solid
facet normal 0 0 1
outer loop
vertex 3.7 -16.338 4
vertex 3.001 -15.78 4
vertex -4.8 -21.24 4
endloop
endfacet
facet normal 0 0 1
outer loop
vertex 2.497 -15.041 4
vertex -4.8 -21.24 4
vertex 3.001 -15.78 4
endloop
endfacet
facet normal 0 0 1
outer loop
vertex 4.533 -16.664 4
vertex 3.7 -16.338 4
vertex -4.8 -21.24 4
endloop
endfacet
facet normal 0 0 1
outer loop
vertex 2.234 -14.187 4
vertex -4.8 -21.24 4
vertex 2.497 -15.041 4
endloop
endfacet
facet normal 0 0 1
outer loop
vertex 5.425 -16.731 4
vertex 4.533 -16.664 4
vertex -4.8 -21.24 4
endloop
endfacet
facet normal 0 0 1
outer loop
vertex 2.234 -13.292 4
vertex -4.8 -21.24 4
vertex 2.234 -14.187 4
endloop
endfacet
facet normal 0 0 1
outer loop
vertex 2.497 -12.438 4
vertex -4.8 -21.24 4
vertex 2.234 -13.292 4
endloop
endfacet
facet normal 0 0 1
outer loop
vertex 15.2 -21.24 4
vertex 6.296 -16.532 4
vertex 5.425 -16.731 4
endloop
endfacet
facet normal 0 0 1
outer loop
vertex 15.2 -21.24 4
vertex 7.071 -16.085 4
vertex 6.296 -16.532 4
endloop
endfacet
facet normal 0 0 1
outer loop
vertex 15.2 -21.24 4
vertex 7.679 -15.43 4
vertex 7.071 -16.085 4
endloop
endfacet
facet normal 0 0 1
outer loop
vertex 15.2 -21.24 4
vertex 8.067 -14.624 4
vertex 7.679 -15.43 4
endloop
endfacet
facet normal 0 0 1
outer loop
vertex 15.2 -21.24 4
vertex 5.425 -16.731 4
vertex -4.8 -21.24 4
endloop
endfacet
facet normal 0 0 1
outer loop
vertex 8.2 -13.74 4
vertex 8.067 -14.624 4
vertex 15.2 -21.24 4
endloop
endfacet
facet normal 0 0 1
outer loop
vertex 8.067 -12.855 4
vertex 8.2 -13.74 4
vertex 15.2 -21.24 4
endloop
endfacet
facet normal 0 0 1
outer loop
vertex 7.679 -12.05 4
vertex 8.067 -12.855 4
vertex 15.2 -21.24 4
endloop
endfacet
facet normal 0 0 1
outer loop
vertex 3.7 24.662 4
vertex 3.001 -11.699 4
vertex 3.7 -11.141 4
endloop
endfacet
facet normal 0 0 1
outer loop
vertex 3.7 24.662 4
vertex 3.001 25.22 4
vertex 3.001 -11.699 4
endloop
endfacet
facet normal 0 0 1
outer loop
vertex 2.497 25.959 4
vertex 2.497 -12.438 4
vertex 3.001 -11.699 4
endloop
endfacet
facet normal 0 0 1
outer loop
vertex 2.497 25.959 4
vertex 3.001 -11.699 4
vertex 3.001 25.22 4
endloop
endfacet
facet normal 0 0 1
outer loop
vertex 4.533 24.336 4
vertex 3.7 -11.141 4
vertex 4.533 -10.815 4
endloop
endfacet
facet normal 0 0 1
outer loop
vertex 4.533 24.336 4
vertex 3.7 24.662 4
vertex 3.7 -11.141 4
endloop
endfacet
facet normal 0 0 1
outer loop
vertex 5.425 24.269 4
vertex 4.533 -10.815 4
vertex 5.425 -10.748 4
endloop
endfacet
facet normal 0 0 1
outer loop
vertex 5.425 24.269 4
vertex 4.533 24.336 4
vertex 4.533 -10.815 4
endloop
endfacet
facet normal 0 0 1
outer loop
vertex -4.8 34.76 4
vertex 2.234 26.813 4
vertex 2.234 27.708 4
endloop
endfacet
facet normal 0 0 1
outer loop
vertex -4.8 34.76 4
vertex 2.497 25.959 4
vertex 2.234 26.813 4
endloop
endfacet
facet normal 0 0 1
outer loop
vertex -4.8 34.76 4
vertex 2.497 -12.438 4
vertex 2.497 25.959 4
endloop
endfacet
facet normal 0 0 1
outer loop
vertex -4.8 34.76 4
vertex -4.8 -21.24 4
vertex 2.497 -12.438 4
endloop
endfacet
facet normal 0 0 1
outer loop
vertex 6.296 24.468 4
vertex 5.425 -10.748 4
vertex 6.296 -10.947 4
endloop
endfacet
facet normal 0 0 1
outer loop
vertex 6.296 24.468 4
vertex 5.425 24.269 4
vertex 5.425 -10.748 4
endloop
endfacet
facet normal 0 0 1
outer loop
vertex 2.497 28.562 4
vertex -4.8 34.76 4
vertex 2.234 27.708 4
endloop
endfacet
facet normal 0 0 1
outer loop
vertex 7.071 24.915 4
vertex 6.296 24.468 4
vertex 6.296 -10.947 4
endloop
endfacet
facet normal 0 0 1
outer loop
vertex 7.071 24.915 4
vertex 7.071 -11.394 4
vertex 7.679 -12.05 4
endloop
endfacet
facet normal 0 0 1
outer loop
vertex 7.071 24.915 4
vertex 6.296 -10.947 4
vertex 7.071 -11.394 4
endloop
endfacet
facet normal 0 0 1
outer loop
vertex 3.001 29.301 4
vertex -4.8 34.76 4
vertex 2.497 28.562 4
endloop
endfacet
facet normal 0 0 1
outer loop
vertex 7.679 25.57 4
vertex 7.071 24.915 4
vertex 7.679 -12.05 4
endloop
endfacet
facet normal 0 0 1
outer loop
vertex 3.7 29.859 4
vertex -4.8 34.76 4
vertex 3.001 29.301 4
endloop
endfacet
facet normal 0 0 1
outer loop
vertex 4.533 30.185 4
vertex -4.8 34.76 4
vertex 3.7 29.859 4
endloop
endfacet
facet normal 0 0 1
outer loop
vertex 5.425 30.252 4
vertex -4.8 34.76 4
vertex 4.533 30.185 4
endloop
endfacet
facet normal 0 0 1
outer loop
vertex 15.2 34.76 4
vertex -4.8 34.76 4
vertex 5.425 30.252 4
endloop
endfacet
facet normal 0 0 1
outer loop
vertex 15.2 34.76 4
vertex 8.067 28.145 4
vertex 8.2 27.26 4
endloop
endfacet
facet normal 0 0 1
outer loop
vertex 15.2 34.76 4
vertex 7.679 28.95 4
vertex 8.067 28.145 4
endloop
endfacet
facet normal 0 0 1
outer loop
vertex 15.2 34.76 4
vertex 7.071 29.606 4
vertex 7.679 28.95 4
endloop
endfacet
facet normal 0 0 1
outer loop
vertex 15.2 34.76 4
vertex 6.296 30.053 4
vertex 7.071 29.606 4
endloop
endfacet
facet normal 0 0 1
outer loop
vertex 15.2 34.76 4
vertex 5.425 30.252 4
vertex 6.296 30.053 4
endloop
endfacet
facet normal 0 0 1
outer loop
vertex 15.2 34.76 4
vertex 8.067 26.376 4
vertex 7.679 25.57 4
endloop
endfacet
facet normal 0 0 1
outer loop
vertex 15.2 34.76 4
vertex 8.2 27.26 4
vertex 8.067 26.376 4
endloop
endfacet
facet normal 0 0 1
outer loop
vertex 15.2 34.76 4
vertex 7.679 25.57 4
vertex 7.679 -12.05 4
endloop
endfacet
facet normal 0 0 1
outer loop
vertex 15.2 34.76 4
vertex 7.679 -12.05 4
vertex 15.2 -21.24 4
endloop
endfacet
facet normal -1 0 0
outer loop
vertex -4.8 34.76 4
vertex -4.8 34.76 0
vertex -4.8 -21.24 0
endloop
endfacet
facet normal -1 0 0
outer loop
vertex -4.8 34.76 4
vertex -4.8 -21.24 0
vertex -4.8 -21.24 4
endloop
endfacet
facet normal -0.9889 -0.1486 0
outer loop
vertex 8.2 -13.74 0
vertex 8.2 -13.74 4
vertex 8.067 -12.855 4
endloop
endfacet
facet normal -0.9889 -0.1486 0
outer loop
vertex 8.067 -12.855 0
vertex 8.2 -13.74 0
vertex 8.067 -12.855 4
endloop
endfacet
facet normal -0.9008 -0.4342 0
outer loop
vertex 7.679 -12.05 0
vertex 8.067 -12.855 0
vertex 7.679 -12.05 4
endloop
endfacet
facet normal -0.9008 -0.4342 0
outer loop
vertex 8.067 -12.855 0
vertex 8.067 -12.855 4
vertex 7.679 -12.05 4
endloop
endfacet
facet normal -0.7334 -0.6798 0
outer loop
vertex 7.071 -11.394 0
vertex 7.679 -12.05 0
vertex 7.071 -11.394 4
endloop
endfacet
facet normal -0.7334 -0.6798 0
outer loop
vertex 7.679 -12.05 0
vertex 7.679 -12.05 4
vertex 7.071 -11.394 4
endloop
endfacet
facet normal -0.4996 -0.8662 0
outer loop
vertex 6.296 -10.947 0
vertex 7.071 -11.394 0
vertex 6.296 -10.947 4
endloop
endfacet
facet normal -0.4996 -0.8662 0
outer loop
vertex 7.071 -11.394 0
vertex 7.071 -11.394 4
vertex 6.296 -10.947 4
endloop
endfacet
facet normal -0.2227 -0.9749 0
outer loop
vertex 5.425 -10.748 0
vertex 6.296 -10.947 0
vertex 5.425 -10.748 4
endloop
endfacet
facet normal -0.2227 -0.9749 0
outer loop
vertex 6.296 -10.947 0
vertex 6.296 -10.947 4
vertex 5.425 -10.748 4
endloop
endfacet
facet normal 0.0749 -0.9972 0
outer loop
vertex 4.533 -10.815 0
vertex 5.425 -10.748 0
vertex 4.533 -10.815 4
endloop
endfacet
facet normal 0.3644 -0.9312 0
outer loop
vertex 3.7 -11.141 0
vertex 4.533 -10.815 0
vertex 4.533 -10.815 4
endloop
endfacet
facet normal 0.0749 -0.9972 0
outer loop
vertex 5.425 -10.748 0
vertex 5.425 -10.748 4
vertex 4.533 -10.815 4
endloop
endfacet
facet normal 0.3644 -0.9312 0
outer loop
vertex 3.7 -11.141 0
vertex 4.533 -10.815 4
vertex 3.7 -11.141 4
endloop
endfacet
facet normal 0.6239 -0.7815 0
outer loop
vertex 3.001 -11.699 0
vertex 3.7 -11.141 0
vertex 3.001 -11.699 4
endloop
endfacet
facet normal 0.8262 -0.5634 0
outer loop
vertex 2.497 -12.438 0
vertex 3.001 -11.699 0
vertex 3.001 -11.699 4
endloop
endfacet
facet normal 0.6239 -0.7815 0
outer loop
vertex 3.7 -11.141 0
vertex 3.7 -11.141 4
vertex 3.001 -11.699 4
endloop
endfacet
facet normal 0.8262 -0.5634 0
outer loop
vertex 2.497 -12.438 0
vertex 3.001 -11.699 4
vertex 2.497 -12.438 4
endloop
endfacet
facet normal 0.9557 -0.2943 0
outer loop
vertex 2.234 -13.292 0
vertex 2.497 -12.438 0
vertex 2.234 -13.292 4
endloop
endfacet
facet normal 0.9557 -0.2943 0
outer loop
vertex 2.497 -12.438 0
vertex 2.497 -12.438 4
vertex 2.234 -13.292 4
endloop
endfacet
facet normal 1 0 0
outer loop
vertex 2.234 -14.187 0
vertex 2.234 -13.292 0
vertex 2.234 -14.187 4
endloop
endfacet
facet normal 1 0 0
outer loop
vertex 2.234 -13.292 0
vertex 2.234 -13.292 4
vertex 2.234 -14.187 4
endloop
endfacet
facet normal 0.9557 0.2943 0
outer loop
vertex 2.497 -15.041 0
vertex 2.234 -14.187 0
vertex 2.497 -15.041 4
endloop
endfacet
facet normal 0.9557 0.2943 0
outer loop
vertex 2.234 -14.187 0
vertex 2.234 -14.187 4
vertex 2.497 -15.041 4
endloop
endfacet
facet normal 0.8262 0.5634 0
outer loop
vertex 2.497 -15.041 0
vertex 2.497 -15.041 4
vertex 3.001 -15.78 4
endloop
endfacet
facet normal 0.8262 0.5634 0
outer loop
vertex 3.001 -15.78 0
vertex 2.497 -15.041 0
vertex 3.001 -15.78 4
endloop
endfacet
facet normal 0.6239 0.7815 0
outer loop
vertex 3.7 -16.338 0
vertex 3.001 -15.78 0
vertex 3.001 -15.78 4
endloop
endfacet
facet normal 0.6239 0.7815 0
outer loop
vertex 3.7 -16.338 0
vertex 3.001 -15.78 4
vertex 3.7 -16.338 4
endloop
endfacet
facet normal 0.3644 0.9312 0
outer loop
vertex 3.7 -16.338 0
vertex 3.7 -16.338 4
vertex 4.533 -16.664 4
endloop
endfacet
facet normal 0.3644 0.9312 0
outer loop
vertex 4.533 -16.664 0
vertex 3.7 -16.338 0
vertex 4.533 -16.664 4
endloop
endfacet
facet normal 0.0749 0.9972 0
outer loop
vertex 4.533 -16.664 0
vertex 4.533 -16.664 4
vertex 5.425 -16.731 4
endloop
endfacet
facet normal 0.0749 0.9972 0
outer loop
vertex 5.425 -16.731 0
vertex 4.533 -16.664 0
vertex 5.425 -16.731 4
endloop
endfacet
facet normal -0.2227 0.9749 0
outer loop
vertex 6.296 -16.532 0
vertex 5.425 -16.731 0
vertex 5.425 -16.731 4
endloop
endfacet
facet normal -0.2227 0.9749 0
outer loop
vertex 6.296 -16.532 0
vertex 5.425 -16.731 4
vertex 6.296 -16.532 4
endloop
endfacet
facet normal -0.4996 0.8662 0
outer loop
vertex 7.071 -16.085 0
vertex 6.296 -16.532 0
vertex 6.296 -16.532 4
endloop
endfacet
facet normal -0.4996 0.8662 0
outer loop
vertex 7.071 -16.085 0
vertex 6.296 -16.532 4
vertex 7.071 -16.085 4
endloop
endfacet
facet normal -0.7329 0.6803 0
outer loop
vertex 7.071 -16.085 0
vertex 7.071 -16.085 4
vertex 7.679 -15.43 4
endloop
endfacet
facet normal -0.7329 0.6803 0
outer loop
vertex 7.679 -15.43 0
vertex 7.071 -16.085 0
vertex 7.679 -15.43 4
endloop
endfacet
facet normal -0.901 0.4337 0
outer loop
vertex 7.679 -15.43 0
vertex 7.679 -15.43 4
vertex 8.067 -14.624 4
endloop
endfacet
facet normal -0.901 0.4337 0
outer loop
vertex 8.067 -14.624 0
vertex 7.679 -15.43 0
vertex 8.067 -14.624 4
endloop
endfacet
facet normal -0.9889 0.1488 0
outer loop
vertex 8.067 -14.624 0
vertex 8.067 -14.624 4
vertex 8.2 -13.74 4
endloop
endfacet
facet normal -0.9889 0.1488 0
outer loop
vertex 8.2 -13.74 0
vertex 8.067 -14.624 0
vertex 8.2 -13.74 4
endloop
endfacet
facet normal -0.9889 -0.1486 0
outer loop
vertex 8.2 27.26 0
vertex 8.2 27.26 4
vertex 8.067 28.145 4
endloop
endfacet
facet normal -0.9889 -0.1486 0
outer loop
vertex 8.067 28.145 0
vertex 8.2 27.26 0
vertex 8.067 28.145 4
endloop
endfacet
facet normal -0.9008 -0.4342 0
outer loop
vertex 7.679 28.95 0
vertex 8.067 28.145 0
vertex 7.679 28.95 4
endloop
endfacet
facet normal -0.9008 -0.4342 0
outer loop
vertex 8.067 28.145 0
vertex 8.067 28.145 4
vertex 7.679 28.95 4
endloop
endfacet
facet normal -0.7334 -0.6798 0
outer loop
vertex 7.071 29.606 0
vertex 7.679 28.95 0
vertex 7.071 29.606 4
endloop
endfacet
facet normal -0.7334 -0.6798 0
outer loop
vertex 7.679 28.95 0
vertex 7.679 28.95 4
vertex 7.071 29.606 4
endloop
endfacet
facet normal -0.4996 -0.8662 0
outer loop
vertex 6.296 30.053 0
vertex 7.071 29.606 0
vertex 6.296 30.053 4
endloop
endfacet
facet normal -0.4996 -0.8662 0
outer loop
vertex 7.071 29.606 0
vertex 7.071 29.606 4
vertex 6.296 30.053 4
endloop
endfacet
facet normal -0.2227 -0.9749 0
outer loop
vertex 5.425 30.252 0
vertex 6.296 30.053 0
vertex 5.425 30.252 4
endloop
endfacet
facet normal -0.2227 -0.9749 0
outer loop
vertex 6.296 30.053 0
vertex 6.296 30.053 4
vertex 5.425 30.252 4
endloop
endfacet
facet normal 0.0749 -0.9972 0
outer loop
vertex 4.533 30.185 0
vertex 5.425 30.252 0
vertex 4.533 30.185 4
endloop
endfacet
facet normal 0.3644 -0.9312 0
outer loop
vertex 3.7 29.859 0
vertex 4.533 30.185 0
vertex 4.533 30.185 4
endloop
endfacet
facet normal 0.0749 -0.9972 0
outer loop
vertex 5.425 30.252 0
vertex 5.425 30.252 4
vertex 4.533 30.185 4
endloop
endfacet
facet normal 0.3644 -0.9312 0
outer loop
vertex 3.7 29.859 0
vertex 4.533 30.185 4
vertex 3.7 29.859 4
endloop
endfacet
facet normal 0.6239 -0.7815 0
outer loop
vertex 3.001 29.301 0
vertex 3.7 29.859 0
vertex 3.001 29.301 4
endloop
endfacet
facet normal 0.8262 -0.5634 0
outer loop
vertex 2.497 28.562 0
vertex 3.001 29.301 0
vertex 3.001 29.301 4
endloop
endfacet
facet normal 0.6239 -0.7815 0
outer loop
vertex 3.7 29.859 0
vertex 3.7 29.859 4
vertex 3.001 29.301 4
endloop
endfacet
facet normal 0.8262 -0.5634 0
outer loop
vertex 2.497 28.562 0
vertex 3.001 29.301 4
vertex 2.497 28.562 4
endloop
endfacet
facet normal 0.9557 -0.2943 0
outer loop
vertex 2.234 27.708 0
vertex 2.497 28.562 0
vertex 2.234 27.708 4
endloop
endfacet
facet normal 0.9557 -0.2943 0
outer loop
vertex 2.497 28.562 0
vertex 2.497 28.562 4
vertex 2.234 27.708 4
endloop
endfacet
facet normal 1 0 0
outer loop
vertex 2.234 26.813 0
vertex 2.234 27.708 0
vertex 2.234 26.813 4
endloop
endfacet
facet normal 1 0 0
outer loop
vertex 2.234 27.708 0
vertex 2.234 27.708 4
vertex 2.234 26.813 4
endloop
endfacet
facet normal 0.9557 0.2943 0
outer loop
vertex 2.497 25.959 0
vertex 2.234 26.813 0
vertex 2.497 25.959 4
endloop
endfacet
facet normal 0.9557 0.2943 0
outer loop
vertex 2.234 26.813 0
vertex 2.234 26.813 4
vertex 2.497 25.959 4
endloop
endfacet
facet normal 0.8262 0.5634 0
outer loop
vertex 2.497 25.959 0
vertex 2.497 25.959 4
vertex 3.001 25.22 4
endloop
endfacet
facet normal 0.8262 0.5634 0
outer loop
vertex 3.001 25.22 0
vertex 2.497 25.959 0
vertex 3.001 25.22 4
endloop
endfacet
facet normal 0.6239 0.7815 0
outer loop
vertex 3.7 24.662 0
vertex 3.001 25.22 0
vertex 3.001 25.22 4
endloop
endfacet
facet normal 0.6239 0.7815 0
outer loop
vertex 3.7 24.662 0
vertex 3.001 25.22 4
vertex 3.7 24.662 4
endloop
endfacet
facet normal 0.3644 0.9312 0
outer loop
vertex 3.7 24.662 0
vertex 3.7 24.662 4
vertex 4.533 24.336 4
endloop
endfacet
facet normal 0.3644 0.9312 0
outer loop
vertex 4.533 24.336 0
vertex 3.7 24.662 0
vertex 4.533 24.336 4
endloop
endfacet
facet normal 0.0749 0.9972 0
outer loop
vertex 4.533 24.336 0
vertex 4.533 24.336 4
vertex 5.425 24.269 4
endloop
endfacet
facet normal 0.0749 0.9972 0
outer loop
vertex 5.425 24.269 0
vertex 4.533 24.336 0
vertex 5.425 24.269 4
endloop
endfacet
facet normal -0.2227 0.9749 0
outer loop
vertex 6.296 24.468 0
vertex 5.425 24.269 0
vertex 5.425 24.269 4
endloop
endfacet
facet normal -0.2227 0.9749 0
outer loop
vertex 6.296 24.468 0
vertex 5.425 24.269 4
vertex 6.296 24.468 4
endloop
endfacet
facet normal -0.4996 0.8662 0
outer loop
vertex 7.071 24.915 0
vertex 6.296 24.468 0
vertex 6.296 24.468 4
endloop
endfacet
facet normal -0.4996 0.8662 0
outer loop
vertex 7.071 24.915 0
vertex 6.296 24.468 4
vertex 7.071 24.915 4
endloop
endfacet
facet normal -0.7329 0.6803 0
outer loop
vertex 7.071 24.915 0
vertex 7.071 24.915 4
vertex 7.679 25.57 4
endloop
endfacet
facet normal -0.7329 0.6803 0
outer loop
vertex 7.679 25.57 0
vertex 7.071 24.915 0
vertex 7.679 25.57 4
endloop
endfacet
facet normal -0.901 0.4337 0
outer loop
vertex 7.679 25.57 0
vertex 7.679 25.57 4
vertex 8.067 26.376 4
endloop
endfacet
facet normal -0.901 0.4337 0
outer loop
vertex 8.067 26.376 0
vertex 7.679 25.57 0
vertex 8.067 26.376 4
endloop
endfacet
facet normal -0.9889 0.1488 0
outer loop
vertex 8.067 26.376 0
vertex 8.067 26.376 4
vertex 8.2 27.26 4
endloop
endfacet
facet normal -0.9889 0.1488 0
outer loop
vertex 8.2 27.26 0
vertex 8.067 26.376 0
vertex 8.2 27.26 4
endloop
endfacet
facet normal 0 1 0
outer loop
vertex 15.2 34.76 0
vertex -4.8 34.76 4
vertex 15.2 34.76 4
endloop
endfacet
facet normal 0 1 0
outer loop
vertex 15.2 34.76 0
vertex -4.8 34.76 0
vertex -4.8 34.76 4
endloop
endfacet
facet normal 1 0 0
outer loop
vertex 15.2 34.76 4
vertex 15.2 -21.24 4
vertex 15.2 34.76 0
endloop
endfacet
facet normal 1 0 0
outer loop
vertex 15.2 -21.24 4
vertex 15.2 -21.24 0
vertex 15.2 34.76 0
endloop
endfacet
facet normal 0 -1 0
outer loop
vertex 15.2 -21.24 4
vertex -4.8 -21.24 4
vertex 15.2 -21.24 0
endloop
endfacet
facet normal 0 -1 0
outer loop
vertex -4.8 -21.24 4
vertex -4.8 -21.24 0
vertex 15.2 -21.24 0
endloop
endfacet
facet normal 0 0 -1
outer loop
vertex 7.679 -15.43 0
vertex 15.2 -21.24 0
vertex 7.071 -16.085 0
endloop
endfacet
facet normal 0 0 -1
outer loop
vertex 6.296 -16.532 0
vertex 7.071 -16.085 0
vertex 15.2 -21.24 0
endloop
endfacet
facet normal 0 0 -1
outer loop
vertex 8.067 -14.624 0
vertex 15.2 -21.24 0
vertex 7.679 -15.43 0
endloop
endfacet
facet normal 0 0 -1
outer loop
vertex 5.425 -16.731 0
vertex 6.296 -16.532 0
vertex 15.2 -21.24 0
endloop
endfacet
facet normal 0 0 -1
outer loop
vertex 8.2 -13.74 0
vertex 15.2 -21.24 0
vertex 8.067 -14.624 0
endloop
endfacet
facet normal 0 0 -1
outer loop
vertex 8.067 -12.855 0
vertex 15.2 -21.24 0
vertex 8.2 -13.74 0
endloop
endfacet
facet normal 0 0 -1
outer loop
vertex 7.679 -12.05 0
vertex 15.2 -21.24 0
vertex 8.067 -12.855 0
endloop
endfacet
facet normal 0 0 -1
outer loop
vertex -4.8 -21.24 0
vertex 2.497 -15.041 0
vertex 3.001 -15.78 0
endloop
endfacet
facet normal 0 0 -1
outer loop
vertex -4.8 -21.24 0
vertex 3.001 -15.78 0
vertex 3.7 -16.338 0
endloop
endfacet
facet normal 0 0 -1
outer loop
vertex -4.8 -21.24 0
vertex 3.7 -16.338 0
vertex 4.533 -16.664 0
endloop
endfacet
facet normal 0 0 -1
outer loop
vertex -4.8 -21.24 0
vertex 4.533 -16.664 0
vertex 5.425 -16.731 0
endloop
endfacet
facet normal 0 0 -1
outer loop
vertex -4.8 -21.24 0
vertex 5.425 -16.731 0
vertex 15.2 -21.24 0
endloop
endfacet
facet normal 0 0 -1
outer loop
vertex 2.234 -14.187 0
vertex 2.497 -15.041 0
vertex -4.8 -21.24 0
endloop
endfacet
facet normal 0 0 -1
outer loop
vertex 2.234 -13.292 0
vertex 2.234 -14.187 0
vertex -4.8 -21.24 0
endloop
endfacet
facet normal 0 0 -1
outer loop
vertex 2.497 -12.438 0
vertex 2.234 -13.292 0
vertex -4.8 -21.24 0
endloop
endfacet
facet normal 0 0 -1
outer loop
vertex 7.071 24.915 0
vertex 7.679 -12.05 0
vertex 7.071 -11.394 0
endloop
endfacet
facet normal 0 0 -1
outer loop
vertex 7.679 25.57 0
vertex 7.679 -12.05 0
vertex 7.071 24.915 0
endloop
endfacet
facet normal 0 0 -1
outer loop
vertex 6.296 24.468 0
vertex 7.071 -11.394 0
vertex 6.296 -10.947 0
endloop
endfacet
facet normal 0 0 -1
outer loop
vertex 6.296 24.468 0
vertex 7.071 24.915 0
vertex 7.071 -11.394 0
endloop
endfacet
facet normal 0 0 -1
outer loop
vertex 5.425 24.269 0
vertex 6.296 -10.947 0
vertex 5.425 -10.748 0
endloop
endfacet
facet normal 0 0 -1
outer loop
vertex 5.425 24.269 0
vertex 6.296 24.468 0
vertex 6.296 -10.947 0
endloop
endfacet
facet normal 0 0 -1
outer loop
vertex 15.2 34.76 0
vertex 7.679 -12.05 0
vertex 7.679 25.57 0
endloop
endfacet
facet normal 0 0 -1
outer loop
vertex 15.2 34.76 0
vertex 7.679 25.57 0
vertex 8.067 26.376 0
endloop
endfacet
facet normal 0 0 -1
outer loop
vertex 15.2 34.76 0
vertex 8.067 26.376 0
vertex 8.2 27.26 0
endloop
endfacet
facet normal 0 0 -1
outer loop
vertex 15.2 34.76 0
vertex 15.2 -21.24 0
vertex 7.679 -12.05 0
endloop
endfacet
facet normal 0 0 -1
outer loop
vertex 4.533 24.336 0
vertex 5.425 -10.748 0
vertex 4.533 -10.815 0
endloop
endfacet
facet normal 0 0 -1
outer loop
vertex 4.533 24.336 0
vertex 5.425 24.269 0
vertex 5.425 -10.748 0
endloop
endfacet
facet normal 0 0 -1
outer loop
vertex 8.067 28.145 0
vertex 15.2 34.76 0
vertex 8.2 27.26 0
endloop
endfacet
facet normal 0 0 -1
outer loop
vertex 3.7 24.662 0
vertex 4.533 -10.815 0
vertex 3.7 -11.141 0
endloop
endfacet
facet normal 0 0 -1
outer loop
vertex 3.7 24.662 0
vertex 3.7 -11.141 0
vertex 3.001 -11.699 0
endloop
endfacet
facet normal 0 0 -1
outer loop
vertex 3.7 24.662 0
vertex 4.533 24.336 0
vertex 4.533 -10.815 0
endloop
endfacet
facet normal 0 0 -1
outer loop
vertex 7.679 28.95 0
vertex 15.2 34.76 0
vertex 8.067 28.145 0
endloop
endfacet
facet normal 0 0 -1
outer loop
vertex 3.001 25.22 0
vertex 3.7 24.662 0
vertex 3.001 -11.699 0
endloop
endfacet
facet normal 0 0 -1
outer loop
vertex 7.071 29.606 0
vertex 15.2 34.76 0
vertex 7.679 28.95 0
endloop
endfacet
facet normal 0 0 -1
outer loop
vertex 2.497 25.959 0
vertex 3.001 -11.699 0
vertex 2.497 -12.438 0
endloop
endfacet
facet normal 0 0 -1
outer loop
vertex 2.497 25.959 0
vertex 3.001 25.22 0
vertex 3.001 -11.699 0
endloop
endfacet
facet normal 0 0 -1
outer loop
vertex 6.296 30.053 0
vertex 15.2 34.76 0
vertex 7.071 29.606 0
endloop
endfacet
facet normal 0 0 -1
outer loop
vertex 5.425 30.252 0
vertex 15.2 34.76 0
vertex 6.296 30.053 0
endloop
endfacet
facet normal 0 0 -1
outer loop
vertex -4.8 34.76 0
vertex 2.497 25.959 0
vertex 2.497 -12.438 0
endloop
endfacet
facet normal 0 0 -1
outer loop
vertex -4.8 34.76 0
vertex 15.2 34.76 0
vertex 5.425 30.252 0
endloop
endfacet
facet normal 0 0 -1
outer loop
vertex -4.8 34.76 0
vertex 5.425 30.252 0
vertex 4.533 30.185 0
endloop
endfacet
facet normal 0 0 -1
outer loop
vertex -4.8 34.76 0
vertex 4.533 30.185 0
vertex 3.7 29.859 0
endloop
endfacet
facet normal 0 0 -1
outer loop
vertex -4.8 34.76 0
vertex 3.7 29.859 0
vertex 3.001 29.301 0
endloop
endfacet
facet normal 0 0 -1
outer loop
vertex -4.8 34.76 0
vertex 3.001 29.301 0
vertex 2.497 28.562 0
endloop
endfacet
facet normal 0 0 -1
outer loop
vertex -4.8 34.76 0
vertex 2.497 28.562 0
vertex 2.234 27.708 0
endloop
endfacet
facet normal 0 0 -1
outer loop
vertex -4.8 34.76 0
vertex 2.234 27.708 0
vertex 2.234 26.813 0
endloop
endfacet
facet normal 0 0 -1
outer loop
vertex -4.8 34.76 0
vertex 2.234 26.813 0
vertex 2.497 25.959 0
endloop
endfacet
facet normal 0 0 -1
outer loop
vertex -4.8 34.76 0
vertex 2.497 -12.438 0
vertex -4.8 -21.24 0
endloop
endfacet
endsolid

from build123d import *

# Parameters (mm, degrees)
BOSS_EXTRUDE1_DEPTH = 35
SKETCH3_R           = 1.5
CUT_EXTRUDE1_DEPTH  = 15
SKETCH2_W           = 4
SKETCH2_H           = 26
BOSS_EXTRUDE2_DEPTH = 20
BOSS_EXTRUDE3_DEPTH = 15
SKETCH6_R           = 3
CUT_EXTRUDE2_DEPTH  = 15
SKETCH7_W           = 15
SKETCH7_H           = 5
BOSS_EXTRUDE4_DEPTH = 31
CUT_EXTRUDE3_DEPTH  = 31


with BuildPart() as part:
    # Sketch1 → Boss-Extrude1 (new body)
    with BuildSketch(Plane.XY):
        Polygon((15.200344072, 13.760447293), (0.200344072, 13.760447293), (0.200344072, -6.239552707), (-4.799655928, -6.239552707), (-4.799655928, 19.760447293), (15.200344072, 19.760447293), align=None)
    extrude(amount=BOSS_EXTRUDE1_DEPTH)

    # Sketch3 → Cut-Extrude1 (cut)
    with BuildSketch(Plane.XZ.offset(-13.760447293)):
        with Locations((7.700344072, 29)):
            Circle(SKETCH3_R)
        with Locations((7.700344072, 22)):
            Circle(SKETCH3_R)
        with Locations((7.700344072, 15)):
            Circle(SKETCH3_R)
    extrude(amount=-CUT_EXTRUDE1_DEPTH, mode=Mode.SUBTRACT)

    # Sketch2 → Boss-Extrude2 (add)
    with BuildSketch(Plane.ZY.offset(4.799655928)):
        with Locations((2, 6.760447293)):
            Rectangle(SKETCH2_W, SKETCH2_H)
    extrude(amount=-BOSS_EXTRUDE2_DEPTH)

    # Sketch5 → Boss-Extrude3 (add)
    with BuildSketch(Plane(origin=(0, 19.760447293, 0), x_dir=(1, 0, 0), z_dir=(0, 1, 0))):
        Polygon((-4.799655928, -4), (0.200344072, -4), (15.200344072, -4), (15.200344072, 0), (-4.799655928, 0), align=None)
    boss_extrude3 = extrude(amount=BOSS_EXTRUDE3_DEPTH)

    # Mirror1: Boss-Extrude3 across plane
    add(boss_extrude3.mirror(Plane.ZX.offset(6.760447293)))

    # Sketch6 → Cut-Extrude2 (cut)
    with BuildSketch(Plane.XY.offset(4)):
        with Locations((5.200344072, -13.739552707)):
            Circle(SKETCH6_R)
        with Locations((5.200344072, 27.260447293)):
            Circle(SKETCH6_R)
    extrude(amount=-CUT_EXTRUDE2_DEPTH, mode=Mode.SUBTRACT)

    # Sketch7 → Boss-Extrude4 (add)
    with BuildSketch(Plane.XY.offset(4)):
        with Locations((7.700344072, -3.739552707)):
            Rectangle(SKETCH7_W, SKETCH7_H)
    extrude(amount=BOSS_EXTRUDE4_DEPTH)

    # Sketch8 → Cut-Extrude3 (cut)
    with BuildSketch(Plane.XY.offset(35)):
        Polygon((15.200344072, 13.760447293), (15.200344072, 19.760447293), (-4.799655928, 19.760447293), (-4.799655928, -6.239552707), (15.200344072, -6.239552707), (15.200344072, -1.239552707), (0.200344072, -1.239552707), (0.200344072, 13.760447293), align=None)
    extrude(amount=-CUT_EXTRUDE3_DEPTH, mode=Mode.SUBTRACT)


solid = part.part
